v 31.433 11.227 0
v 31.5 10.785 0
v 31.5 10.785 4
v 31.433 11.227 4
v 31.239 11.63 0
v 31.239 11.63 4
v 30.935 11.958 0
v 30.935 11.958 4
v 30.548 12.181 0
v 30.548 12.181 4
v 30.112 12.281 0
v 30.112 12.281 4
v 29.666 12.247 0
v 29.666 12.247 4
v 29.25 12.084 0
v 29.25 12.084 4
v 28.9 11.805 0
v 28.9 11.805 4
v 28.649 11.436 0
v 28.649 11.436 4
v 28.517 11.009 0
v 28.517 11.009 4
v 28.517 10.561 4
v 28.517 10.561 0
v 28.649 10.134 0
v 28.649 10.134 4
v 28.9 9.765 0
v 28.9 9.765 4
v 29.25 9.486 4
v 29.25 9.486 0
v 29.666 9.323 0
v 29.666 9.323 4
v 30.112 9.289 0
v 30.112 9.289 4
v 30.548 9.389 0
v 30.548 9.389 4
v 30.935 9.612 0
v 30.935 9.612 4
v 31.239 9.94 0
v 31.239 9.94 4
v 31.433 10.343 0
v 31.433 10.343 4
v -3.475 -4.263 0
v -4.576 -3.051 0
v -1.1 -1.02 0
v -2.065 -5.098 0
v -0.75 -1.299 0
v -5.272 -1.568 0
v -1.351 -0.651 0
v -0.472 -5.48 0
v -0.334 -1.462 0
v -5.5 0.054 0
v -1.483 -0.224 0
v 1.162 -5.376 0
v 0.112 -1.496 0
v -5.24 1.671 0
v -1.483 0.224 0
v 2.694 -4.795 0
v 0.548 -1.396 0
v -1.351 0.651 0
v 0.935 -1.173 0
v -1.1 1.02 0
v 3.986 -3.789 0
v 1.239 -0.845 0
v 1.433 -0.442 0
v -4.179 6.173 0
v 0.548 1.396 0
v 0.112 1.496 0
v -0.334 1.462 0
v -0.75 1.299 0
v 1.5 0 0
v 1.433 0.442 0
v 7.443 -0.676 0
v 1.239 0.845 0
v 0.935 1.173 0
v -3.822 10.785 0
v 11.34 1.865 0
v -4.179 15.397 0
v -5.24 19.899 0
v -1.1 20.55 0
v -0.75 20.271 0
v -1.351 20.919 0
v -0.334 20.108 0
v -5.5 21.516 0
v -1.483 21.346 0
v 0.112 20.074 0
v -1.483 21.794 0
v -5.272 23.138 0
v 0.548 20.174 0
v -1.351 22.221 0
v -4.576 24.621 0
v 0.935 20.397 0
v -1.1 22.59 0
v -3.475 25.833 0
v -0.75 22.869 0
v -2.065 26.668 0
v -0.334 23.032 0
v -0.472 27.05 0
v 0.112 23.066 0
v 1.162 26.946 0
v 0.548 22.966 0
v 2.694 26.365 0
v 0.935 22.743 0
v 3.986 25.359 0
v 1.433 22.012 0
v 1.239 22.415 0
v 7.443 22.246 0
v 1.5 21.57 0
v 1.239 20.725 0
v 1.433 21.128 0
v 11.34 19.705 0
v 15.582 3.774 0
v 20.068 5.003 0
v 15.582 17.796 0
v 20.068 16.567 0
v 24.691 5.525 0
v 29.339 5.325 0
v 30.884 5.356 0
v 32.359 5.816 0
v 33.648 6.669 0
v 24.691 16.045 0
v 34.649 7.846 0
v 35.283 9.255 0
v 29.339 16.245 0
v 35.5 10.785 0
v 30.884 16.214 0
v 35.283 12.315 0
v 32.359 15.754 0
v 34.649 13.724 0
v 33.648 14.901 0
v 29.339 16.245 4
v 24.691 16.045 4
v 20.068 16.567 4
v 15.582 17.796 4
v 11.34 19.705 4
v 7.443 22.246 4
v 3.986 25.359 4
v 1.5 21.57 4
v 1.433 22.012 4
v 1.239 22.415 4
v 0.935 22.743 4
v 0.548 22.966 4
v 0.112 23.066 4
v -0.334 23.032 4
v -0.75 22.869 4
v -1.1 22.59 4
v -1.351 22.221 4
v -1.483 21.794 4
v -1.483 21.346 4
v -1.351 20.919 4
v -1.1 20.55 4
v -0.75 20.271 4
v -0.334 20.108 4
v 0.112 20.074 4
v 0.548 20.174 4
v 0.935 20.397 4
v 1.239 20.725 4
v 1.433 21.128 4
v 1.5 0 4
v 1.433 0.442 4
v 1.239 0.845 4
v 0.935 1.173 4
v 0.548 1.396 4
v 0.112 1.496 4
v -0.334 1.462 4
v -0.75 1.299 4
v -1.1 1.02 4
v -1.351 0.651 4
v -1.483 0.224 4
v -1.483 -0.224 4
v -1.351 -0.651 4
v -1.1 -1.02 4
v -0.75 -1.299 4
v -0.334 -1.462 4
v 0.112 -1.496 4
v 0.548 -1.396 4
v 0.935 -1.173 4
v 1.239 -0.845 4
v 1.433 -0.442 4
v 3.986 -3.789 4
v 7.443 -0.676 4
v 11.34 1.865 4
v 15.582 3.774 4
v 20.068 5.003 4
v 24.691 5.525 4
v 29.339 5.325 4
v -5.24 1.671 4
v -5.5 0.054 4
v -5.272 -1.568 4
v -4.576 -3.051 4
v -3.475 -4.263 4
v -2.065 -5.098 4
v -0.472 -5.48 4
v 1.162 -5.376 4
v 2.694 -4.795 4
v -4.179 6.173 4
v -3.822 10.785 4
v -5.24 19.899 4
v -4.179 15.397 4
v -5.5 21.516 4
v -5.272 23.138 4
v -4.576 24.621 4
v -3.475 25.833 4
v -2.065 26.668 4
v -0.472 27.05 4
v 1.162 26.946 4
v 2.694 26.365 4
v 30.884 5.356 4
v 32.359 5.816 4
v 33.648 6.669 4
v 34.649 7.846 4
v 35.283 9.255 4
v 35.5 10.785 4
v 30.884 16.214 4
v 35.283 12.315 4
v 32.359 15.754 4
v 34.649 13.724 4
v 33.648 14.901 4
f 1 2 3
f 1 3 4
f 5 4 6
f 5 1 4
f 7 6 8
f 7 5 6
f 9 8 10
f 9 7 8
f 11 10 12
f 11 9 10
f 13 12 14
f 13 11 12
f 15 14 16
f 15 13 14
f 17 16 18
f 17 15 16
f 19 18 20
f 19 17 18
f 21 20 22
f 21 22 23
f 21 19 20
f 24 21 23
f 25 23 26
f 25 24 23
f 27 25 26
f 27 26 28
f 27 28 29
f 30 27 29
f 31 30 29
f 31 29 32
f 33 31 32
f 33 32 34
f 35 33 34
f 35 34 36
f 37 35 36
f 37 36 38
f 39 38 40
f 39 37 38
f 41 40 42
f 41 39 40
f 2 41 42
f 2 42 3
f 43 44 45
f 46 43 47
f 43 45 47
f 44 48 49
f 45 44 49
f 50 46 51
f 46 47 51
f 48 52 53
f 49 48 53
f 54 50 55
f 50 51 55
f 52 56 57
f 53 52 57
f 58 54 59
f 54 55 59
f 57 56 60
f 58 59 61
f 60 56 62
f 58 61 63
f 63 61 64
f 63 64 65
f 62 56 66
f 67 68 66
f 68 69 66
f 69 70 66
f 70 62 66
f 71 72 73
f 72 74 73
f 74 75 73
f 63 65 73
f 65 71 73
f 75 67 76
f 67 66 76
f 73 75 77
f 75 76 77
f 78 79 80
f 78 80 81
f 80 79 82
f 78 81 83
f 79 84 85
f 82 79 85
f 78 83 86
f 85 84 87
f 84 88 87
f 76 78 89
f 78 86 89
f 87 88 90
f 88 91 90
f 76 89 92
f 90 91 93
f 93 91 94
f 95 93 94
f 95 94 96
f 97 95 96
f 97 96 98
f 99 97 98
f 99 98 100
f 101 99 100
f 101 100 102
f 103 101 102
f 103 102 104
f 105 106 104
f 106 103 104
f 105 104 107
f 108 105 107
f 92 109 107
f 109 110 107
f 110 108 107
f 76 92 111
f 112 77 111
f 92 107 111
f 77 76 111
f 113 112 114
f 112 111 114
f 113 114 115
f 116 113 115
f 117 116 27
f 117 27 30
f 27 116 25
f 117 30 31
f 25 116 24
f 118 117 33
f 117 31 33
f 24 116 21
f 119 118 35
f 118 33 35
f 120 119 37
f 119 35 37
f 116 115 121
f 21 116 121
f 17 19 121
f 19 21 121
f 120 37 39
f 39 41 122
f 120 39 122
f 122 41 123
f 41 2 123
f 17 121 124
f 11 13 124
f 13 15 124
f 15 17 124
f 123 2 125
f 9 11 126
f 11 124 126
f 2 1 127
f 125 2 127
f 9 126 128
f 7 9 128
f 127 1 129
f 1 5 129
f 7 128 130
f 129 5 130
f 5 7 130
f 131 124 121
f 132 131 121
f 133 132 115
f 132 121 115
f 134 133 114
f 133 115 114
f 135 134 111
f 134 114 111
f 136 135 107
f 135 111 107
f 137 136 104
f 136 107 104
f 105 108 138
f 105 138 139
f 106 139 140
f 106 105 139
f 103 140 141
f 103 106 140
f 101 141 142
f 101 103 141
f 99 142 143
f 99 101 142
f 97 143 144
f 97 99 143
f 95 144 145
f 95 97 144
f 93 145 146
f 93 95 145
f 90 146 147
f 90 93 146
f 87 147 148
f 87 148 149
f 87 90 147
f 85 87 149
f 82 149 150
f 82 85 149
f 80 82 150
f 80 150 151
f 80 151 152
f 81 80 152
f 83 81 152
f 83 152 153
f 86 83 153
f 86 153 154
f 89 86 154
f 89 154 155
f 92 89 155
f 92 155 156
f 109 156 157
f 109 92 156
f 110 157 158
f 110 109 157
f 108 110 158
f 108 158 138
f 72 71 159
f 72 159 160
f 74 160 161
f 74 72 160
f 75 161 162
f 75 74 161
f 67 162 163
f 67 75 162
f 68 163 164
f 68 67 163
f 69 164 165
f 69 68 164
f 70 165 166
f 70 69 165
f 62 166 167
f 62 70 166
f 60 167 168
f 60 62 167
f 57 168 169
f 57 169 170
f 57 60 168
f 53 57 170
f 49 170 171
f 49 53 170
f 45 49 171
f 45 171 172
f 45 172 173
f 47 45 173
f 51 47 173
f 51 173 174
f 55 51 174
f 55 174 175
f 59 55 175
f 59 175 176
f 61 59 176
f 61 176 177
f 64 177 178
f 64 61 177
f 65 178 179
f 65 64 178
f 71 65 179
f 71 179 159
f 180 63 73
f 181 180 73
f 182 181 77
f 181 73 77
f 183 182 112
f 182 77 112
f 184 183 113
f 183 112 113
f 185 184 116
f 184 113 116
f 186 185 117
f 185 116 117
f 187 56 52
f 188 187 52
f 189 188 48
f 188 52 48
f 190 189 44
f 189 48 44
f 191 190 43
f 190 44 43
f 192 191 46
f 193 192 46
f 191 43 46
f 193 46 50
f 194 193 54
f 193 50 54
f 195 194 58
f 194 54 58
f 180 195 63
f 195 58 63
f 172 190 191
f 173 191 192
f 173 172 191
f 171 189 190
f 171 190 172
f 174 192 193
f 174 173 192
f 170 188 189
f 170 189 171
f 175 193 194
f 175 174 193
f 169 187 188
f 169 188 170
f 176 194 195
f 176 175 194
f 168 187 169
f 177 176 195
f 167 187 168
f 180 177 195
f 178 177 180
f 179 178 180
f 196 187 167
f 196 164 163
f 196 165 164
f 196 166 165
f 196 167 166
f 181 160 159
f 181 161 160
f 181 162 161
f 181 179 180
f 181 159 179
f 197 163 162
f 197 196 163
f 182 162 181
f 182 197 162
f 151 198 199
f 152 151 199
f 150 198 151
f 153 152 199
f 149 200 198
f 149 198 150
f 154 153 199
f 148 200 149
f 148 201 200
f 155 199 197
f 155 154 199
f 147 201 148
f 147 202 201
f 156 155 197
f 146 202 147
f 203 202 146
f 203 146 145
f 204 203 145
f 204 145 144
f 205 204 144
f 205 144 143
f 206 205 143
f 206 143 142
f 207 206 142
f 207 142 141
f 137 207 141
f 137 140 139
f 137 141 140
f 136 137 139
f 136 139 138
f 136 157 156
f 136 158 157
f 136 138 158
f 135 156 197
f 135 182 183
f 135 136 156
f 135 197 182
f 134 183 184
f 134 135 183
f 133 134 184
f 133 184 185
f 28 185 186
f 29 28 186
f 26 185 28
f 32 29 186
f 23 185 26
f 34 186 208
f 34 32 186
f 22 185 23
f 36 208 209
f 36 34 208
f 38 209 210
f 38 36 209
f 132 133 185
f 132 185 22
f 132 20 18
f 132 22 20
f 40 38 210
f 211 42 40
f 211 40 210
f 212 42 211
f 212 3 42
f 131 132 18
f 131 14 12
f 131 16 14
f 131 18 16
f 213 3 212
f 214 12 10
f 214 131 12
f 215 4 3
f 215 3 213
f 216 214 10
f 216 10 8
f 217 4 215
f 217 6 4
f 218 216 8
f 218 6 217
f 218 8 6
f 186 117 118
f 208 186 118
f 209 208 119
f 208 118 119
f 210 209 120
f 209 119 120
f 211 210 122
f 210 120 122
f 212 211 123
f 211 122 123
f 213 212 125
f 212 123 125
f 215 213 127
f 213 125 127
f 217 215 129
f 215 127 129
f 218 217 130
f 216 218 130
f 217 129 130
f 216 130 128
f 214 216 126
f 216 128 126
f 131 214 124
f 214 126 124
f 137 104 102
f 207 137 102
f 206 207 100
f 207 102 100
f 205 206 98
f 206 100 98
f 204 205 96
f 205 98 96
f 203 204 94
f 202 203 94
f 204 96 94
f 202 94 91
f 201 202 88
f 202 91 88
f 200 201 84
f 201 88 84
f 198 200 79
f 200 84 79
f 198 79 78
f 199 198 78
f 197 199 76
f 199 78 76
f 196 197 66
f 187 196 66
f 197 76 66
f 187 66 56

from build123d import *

# Parameters (mm, degrees)
SKETCH1_R           = 1.5
BOSS_EXTRUDE1_DEPTH = 4


with BuildPart() as part:
    # Sketch1 → Boss-Extrude1 (new body)
    with BuildSketch(Plane.XY):
        with BuildLine():
            ThreePointArc((3.986498359, 25.359172843), (-2.801068394, 26.303288059), (-5.24004212, 19.899084507))
            ThreePointArc((-5.24004212, 19.899084507), (-3.822090045, 10.785), (-5.24004212, 1.670915493))
            ThreePointArc((-5.24004212, 1.670915493), (-2.801068394, -4.733288059), (3.986498359, -3.789172843))
            ThreePointArc((3.986498359, -3.789172843), (15.581947878, 3.773729824), (29.338611035, 5.324911664))
            ThreePointArc((29.338611035, 5.324911664), (35.5, 10.785), (29.338611035, 16.245088336))
            ThreePointArc((29.338611035, 16.245088336), (15.581947878, 17.796270176), (3.986498359, 25.359172843))
        make_face()
        with Locations((0, 21.57)):
            Circle(SKETCH1_R, mode=Mode.SUBTRACT)
        with Locations((30, 10.785)):
            Circle(SKETCH1_R, mode=Mode.SUBTRACT)
        Circle(SKETCH1_R, mode=Mode.SUBTRACT)
    extrude(amount=BOSS_EXTRUDE1_DEPTH)


solid = part.part
